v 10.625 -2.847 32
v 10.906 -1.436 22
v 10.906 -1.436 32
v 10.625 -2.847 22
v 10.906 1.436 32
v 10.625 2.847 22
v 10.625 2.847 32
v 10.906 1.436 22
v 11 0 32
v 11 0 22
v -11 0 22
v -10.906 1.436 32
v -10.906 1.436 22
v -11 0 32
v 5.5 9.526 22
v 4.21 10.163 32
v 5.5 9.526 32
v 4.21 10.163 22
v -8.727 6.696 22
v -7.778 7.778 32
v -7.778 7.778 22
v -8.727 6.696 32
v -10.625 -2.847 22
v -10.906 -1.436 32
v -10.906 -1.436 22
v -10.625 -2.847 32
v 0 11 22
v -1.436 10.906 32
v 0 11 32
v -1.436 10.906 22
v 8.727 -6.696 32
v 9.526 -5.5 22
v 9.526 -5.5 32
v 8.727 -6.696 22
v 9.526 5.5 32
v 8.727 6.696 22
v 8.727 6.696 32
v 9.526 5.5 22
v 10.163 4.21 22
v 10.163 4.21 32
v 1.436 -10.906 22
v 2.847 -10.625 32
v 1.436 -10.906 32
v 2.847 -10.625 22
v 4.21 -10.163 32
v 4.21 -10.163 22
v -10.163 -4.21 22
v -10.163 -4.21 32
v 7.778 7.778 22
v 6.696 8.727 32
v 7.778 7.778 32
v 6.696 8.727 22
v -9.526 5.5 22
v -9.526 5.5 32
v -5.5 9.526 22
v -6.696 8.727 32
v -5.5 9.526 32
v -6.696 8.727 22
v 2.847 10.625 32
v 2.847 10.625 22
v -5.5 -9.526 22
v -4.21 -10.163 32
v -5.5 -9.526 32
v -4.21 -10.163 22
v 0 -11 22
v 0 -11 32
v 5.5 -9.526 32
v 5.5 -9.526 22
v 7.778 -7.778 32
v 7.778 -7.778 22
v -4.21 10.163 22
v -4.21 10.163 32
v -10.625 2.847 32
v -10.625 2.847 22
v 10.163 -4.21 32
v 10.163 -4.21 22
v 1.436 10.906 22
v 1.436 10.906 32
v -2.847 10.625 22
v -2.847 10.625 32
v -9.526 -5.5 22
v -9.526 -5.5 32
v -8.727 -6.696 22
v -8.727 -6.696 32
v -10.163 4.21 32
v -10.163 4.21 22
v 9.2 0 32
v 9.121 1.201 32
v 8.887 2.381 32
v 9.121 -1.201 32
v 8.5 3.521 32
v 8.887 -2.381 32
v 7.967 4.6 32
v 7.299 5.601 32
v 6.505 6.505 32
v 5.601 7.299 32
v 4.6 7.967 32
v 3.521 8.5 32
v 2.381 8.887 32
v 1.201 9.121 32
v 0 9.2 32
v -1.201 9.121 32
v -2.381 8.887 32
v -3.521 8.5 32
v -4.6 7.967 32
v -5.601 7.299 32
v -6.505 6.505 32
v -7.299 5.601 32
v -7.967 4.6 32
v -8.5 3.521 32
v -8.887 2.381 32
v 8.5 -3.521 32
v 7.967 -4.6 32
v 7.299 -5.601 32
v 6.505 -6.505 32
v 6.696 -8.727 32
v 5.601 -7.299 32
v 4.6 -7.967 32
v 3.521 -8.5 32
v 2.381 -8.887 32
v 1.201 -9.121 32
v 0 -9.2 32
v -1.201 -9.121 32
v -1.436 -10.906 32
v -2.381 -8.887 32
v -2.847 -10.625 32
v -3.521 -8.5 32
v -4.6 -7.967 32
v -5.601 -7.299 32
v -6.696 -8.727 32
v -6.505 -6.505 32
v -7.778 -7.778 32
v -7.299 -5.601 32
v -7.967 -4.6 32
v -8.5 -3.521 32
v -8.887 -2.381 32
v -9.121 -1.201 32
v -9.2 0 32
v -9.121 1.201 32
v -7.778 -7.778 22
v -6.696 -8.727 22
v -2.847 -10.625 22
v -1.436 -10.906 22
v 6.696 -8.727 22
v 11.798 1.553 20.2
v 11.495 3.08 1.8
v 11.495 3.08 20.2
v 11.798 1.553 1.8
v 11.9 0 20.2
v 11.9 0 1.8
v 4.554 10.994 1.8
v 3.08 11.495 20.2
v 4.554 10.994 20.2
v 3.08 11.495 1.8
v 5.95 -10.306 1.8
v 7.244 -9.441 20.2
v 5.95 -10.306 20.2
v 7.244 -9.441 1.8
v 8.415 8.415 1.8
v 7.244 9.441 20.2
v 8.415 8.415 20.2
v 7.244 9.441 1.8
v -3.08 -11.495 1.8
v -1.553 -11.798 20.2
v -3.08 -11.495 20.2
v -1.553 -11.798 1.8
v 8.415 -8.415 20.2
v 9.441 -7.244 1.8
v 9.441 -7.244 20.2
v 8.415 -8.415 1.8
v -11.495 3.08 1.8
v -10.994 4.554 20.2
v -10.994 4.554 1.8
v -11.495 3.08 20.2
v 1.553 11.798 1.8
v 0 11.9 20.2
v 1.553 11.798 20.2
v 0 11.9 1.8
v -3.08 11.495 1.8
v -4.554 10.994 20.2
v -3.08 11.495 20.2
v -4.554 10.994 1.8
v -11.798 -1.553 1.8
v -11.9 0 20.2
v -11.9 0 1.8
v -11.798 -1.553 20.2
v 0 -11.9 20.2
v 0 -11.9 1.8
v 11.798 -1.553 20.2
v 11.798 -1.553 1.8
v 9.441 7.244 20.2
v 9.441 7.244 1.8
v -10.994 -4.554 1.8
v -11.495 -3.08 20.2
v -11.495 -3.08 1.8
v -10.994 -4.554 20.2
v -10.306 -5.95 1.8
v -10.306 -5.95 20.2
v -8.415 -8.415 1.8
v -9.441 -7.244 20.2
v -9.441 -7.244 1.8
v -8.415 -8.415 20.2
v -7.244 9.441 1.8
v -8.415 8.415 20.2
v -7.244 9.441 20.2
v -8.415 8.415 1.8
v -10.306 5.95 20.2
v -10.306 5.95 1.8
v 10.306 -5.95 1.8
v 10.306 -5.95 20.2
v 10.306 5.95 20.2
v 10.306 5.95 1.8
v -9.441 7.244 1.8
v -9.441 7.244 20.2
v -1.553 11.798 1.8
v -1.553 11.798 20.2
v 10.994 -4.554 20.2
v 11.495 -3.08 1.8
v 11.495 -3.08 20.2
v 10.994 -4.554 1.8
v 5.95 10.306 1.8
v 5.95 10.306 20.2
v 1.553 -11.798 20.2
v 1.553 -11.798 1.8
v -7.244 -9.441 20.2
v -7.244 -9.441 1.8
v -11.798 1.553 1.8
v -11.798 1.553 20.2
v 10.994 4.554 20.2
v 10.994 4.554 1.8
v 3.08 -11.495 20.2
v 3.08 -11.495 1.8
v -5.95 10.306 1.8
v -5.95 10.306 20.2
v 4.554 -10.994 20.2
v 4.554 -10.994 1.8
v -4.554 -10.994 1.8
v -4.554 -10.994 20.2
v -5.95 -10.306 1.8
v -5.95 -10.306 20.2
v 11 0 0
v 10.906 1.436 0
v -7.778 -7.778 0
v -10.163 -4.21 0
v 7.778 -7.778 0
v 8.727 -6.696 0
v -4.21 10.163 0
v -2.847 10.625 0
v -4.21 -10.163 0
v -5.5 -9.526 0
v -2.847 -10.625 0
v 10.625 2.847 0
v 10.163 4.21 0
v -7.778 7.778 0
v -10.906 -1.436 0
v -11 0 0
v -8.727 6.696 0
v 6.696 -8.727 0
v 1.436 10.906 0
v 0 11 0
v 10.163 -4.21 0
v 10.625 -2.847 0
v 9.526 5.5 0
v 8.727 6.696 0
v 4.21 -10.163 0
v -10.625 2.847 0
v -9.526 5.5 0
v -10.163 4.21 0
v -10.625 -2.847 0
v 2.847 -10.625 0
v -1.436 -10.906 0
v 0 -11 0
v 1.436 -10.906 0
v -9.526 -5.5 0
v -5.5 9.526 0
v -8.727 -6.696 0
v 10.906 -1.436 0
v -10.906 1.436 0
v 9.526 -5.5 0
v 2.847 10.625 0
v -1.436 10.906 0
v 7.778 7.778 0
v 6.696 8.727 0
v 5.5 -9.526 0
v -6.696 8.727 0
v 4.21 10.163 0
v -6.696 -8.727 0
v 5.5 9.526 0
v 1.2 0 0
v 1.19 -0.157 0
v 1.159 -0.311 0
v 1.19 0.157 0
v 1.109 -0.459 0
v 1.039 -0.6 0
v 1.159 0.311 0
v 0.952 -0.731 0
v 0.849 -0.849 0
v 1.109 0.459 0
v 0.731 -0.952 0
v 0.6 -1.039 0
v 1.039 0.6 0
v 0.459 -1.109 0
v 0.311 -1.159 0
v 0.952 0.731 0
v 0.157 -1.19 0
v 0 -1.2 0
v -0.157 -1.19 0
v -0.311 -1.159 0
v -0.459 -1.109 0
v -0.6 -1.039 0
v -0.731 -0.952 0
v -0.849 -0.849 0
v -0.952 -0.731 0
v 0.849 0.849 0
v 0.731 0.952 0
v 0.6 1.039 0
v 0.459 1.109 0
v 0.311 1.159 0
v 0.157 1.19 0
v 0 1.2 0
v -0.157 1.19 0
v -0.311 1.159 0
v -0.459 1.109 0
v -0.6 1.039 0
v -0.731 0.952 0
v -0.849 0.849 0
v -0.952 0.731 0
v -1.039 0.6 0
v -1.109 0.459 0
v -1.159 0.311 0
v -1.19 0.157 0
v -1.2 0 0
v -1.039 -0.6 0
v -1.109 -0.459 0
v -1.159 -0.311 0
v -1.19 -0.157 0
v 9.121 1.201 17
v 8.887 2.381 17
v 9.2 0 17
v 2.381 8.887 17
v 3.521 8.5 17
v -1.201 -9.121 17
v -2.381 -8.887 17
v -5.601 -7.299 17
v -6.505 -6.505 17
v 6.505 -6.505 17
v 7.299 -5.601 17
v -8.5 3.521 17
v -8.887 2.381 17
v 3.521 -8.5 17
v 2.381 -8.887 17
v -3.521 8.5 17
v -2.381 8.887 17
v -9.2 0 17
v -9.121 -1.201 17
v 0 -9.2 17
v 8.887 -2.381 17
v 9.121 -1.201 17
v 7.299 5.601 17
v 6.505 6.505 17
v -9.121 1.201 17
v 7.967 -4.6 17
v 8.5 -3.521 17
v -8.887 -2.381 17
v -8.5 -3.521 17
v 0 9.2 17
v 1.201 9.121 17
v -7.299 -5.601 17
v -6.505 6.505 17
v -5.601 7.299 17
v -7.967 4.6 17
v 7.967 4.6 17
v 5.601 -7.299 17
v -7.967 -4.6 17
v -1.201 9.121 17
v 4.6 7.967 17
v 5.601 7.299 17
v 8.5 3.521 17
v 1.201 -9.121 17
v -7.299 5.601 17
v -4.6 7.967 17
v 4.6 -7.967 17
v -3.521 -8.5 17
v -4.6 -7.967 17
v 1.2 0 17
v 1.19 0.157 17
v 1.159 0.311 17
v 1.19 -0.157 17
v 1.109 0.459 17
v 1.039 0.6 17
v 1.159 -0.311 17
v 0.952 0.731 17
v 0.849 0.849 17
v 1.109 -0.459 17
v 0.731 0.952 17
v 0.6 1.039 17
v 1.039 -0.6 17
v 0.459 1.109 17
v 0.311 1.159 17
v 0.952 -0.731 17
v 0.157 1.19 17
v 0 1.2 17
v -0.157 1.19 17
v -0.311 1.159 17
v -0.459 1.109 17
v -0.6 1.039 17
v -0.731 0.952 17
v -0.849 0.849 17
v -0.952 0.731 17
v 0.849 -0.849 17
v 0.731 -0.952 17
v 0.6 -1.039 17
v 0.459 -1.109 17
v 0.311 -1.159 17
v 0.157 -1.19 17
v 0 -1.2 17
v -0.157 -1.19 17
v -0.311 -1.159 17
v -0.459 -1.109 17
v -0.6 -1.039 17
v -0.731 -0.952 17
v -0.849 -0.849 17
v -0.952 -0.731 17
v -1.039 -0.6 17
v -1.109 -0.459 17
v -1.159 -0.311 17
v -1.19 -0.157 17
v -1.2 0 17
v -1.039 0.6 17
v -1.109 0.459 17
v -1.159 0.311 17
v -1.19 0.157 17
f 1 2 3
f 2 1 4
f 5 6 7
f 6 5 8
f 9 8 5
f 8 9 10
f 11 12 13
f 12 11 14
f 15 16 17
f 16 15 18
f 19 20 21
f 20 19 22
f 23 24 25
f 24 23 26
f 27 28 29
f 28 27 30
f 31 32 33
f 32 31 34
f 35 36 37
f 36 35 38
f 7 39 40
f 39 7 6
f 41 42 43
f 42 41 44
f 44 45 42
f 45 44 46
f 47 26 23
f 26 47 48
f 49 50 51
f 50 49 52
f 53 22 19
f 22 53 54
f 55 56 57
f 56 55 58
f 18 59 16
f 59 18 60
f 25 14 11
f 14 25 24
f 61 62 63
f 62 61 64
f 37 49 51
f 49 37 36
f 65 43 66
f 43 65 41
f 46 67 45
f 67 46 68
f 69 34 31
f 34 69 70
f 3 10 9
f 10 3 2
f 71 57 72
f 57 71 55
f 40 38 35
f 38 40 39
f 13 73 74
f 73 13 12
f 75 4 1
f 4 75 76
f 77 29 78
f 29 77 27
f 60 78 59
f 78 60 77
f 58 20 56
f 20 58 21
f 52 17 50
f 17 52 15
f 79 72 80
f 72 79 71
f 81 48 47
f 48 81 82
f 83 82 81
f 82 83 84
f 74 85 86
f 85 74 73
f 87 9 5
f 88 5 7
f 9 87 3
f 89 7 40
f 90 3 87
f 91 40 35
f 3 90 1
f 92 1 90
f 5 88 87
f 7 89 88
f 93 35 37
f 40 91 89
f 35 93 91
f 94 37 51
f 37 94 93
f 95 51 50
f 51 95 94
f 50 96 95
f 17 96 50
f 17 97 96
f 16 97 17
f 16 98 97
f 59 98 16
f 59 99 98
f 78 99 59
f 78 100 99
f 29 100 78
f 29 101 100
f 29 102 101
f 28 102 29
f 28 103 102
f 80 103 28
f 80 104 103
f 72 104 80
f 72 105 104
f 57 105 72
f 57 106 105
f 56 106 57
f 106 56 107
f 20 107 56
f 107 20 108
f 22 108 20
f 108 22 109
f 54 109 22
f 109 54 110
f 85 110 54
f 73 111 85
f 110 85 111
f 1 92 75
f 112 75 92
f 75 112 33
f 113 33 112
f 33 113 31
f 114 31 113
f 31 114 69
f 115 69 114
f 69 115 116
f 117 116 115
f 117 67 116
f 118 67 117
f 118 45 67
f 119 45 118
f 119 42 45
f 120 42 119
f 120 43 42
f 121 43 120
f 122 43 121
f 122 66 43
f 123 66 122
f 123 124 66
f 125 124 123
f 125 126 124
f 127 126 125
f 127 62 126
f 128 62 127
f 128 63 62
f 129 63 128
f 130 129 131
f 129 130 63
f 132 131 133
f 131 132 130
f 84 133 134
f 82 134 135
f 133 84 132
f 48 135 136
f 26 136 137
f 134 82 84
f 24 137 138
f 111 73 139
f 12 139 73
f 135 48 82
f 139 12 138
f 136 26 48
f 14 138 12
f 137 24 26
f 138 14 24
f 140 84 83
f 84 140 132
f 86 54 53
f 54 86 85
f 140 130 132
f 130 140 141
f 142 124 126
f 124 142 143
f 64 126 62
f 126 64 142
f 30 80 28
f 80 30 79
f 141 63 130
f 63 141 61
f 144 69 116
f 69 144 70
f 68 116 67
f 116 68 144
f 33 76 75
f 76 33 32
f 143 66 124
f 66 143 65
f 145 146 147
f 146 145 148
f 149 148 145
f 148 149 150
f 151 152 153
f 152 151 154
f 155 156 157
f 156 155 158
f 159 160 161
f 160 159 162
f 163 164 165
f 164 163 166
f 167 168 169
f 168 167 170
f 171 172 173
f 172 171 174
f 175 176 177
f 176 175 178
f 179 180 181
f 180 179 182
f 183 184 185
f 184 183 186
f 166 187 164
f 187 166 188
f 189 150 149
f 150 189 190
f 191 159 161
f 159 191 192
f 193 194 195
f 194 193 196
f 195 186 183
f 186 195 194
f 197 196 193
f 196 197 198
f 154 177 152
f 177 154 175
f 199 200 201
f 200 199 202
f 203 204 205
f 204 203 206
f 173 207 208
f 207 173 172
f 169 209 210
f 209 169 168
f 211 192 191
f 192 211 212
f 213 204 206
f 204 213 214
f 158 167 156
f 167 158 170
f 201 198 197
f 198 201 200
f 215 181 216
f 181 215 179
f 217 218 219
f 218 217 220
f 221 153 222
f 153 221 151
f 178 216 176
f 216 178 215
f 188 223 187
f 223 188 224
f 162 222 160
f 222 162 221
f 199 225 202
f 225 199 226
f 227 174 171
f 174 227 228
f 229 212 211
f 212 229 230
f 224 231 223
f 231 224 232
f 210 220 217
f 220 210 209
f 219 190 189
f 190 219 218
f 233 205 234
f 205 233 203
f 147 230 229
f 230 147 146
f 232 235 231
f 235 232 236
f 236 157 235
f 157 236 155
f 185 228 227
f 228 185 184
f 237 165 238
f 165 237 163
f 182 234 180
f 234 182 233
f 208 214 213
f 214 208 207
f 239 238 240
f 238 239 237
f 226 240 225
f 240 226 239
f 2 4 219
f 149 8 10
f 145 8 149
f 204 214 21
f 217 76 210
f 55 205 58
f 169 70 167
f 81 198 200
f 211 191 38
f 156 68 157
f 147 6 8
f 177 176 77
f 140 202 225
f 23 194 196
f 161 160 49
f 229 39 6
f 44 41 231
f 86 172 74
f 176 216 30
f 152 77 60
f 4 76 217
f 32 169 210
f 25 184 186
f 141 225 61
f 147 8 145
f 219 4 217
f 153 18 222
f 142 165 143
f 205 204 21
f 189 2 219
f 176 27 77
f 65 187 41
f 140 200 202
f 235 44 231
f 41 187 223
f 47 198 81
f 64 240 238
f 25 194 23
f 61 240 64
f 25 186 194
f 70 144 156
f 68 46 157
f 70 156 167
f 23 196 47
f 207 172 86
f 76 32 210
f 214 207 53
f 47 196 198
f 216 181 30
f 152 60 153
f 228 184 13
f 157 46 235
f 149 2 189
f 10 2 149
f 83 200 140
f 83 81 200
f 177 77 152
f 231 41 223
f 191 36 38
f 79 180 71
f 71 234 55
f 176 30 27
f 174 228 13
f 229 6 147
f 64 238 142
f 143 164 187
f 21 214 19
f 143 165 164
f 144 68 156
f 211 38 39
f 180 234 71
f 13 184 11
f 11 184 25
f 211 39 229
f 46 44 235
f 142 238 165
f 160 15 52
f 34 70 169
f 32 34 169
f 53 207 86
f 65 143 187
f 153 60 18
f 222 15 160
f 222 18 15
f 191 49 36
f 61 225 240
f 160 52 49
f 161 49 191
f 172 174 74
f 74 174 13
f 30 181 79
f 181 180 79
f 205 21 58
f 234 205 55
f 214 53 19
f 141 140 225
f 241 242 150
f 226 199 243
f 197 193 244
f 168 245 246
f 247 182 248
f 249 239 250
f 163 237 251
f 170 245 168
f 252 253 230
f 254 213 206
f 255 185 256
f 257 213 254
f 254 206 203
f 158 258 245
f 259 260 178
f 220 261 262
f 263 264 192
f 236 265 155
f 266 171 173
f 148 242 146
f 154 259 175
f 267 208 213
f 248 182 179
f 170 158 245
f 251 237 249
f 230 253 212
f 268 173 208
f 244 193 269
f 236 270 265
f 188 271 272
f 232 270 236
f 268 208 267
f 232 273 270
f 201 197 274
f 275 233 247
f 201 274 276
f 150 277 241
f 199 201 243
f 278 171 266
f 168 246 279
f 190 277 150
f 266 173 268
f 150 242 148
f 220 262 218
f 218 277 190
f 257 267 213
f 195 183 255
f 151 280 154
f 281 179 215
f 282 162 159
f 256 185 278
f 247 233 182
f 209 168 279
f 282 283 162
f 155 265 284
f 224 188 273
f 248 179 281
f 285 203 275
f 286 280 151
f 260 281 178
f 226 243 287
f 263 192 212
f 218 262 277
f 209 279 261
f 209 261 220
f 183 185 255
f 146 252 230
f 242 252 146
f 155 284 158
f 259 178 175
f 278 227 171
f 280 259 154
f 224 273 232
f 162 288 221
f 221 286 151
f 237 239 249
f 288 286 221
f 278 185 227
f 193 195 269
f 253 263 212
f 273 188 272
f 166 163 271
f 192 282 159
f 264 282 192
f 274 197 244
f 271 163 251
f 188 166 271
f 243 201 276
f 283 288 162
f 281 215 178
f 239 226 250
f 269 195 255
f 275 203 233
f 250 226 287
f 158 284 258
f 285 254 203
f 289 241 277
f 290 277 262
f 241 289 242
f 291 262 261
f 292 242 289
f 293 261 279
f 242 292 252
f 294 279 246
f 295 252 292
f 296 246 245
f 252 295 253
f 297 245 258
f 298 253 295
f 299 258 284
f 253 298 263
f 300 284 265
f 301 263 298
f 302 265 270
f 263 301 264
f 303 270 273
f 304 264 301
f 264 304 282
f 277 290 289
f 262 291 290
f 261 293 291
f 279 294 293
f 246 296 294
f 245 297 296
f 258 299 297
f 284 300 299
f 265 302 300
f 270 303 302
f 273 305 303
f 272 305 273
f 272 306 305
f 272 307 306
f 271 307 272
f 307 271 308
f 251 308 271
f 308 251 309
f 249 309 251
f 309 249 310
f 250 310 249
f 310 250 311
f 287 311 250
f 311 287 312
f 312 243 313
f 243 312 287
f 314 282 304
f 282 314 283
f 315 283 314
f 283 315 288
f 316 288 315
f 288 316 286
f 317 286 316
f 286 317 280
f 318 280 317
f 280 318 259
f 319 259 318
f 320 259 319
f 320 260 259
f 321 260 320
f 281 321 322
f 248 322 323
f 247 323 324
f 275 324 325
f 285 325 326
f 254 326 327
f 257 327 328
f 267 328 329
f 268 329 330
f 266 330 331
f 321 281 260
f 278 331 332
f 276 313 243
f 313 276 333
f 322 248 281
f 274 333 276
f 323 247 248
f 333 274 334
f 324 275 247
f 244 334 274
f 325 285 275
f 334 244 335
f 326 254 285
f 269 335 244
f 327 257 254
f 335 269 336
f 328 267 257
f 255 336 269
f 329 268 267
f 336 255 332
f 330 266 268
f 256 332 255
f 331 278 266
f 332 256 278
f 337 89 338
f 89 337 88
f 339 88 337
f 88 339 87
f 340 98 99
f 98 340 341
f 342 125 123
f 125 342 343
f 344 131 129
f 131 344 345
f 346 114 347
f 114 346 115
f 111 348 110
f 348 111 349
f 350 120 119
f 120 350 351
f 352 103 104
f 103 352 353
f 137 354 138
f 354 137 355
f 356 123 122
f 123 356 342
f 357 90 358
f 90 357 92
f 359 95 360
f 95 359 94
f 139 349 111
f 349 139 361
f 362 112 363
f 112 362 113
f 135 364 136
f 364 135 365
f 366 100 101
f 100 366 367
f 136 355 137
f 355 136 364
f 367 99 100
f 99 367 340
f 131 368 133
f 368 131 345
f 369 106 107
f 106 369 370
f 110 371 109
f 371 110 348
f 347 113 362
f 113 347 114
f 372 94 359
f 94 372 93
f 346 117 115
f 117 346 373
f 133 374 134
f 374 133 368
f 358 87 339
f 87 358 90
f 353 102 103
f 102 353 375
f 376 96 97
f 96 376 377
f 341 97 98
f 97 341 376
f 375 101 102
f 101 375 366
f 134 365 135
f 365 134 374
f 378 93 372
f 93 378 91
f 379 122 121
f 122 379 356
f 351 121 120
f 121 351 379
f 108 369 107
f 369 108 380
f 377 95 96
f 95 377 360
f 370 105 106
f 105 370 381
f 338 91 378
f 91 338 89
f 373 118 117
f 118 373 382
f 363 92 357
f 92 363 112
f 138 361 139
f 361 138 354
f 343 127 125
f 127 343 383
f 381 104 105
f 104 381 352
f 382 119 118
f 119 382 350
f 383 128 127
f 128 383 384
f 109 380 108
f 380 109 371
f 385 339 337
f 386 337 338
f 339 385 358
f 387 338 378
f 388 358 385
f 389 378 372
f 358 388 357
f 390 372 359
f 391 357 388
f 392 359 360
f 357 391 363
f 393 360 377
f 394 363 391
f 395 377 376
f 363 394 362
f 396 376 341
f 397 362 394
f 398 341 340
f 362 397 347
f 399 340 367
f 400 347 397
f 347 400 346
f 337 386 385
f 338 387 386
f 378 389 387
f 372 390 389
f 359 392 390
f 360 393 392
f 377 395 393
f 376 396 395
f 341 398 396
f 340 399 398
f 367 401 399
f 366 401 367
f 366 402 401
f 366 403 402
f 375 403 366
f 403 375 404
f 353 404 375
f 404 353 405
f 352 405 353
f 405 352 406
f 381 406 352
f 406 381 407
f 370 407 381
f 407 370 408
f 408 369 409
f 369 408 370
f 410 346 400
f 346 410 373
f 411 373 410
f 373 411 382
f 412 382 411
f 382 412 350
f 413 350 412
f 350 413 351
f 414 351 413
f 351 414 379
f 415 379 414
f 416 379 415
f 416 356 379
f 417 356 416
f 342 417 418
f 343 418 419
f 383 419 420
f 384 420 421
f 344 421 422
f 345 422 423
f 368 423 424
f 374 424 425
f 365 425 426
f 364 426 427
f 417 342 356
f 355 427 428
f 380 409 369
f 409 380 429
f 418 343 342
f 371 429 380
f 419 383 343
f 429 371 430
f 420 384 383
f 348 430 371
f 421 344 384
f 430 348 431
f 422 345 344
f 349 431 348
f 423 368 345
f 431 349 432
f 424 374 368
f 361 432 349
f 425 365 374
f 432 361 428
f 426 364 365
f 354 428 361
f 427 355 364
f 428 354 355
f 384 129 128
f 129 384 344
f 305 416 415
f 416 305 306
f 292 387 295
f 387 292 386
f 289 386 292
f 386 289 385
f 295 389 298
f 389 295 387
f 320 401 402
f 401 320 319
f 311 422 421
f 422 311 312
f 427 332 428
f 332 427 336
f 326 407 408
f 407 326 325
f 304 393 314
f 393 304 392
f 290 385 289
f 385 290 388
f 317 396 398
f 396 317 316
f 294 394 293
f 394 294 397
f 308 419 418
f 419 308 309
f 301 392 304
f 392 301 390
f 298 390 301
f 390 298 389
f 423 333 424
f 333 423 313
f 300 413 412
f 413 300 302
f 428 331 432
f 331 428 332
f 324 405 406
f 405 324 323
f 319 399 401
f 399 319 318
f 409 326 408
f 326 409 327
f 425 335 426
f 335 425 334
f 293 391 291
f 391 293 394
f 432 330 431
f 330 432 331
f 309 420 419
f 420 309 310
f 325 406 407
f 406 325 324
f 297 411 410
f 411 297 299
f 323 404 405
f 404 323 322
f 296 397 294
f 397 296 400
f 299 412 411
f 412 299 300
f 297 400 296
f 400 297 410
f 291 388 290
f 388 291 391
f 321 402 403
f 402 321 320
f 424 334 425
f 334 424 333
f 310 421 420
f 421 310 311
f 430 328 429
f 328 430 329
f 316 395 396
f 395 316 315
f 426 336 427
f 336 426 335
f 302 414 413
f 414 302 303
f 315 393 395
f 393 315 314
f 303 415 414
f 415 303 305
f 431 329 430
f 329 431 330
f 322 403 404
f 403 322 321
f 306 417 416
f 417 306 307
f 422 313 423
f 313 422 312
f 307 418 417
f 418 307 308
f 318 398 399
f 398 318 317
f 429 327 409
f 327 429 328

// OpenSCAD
// Copyright 2017 Arthur Davis (thingiverse.com/artdavis)
// This file is licensed under a Creative Commons Attribution 4.0
// International License.
// THE SOFTWARE IS PROVIDED "AS IS", WITHOUT WARRANTY OF ANY KIND, EXPRESS OR
// IMPLIED, INCLUDING BUT NOT LIMITED TO THE WARRANTIES OF MERCHANTABILITY,
// FITNESS FOR A PARTICULAR PURPOSE AND NONINFRINGEMENT. IN NO EVENT SHALL THE
// AUTHORS OR COPYRIGHT HOLDERS BE LIABLE FOR ANY CLAIM, DAMAGES OR OTHER
// LIABILITY, WHETHER IN AN ACTION OF CONTRACT, TORT OR OTHERWISE, ARISING
// FROM, OUT OF OR IN CONNECTION WITH THE SOFTWARE OR THE USE OR OTHER
// DEALINGS IN THE SOFTWARE.
//
// A coupler that may be used to join a model rocket nose cone
// to the main body tube. This is especially useful for a split
// halves nose cone as in the Eggloft Egg Rocket Nose Cone here:
// http://www.thingiverse.com/thing:2228825
// The top setback portion is available area to tape the shoulder
// of the nose cone to this coupler. This length in combination
// with the length of the nose cone shoulder should be enough to
// accommodate the width of the tape that will be used.
// The hole in the bottom allows an eyelet to be screwed in to
// the coupler for tying to the shock cord.
//
// Estes body tube dimensions
// Ref: http://www.estesrockets.com
// Inner diameters:
// BT-5: 13.2mm
// BT-20: 18.0mm
// BT-50: 24.1mm
// BT-55: 32.6mm
// BT-60: 40.5mm
// Outer diameters:
// BT-5: 13.8mm
// BT-20: 18.7mm
// BT-50: 24.8mm
// BT-55: 34.0mm
// BT-60: 42.0mm
//
// 2017-05-07: File creation
// 2017-06-08: Added fillet/chamfer feature to bottom of coupler
//             for easier body tube insertion.

// Optimize view for Makerbot Customizer:
// preview[view:south east, tilt:top diagonal]

// Body Tube Inner Diameter
btid = 23.8; // [5:0.1:60]
// Coupling pocket inner diameter
pid = 18.4; // [5:0.1:60]
// Coupler coupling outer diameter
ccod = 22.0; // [5:0.1:60]
// Length of the whole coupling
length = 32.0; // [5:0.1:60]
// Diameter for eyelet screw hole
hole_diam = 2.4; // [0:0.1:10]
// Depth of coupling pocket
pocket = 15.0; // [0:0.1:60]
// Length of coupler coupling OD to expose
setback = 10.0; // [0:0.1:60]

/* [Hidden] */
// Special variables for facets/arcs
$fn = 48;
// Overlap offset for improved CSG operations
delta = 0.1;
// Ledge thickness
lth = btid - ccod;
// Fillet angle (deg)
fa = 45;
// Fillet height
fht = tan(fa) * lth;

difference() {
    difference() {
        union() {
            translate(v = [0, 0, length - setback]) {
                // Top of coupling
                cylinder(h=setback, d=ccod);
            }
            // Bottom of coupling
            translate(v = [0, 0, fht]) {
                cylinder(h = length - setback - 2*fht, d = btid);
            }
            // Top Fillet
            translate(v = [0, 0, length - setback - fht]) {
                cylinder(h=fht, d1=btid, d2=ccod);
            }
            // Bottom Fillet
            translate(v = [0, 0, 0]) {
                cylinder(h=fht, d1=ccod, d2=btid);
            }
            
        }

        // Coupling pocket
        translate(v = [0, 0, length - pocket]) {
            cylinder(h=pocket + delta, d = pid);
        }
    }
    // Eyelet screw hole
    cylinder(h = 2*(length + delta), d = hole_diam, center=true);
}
